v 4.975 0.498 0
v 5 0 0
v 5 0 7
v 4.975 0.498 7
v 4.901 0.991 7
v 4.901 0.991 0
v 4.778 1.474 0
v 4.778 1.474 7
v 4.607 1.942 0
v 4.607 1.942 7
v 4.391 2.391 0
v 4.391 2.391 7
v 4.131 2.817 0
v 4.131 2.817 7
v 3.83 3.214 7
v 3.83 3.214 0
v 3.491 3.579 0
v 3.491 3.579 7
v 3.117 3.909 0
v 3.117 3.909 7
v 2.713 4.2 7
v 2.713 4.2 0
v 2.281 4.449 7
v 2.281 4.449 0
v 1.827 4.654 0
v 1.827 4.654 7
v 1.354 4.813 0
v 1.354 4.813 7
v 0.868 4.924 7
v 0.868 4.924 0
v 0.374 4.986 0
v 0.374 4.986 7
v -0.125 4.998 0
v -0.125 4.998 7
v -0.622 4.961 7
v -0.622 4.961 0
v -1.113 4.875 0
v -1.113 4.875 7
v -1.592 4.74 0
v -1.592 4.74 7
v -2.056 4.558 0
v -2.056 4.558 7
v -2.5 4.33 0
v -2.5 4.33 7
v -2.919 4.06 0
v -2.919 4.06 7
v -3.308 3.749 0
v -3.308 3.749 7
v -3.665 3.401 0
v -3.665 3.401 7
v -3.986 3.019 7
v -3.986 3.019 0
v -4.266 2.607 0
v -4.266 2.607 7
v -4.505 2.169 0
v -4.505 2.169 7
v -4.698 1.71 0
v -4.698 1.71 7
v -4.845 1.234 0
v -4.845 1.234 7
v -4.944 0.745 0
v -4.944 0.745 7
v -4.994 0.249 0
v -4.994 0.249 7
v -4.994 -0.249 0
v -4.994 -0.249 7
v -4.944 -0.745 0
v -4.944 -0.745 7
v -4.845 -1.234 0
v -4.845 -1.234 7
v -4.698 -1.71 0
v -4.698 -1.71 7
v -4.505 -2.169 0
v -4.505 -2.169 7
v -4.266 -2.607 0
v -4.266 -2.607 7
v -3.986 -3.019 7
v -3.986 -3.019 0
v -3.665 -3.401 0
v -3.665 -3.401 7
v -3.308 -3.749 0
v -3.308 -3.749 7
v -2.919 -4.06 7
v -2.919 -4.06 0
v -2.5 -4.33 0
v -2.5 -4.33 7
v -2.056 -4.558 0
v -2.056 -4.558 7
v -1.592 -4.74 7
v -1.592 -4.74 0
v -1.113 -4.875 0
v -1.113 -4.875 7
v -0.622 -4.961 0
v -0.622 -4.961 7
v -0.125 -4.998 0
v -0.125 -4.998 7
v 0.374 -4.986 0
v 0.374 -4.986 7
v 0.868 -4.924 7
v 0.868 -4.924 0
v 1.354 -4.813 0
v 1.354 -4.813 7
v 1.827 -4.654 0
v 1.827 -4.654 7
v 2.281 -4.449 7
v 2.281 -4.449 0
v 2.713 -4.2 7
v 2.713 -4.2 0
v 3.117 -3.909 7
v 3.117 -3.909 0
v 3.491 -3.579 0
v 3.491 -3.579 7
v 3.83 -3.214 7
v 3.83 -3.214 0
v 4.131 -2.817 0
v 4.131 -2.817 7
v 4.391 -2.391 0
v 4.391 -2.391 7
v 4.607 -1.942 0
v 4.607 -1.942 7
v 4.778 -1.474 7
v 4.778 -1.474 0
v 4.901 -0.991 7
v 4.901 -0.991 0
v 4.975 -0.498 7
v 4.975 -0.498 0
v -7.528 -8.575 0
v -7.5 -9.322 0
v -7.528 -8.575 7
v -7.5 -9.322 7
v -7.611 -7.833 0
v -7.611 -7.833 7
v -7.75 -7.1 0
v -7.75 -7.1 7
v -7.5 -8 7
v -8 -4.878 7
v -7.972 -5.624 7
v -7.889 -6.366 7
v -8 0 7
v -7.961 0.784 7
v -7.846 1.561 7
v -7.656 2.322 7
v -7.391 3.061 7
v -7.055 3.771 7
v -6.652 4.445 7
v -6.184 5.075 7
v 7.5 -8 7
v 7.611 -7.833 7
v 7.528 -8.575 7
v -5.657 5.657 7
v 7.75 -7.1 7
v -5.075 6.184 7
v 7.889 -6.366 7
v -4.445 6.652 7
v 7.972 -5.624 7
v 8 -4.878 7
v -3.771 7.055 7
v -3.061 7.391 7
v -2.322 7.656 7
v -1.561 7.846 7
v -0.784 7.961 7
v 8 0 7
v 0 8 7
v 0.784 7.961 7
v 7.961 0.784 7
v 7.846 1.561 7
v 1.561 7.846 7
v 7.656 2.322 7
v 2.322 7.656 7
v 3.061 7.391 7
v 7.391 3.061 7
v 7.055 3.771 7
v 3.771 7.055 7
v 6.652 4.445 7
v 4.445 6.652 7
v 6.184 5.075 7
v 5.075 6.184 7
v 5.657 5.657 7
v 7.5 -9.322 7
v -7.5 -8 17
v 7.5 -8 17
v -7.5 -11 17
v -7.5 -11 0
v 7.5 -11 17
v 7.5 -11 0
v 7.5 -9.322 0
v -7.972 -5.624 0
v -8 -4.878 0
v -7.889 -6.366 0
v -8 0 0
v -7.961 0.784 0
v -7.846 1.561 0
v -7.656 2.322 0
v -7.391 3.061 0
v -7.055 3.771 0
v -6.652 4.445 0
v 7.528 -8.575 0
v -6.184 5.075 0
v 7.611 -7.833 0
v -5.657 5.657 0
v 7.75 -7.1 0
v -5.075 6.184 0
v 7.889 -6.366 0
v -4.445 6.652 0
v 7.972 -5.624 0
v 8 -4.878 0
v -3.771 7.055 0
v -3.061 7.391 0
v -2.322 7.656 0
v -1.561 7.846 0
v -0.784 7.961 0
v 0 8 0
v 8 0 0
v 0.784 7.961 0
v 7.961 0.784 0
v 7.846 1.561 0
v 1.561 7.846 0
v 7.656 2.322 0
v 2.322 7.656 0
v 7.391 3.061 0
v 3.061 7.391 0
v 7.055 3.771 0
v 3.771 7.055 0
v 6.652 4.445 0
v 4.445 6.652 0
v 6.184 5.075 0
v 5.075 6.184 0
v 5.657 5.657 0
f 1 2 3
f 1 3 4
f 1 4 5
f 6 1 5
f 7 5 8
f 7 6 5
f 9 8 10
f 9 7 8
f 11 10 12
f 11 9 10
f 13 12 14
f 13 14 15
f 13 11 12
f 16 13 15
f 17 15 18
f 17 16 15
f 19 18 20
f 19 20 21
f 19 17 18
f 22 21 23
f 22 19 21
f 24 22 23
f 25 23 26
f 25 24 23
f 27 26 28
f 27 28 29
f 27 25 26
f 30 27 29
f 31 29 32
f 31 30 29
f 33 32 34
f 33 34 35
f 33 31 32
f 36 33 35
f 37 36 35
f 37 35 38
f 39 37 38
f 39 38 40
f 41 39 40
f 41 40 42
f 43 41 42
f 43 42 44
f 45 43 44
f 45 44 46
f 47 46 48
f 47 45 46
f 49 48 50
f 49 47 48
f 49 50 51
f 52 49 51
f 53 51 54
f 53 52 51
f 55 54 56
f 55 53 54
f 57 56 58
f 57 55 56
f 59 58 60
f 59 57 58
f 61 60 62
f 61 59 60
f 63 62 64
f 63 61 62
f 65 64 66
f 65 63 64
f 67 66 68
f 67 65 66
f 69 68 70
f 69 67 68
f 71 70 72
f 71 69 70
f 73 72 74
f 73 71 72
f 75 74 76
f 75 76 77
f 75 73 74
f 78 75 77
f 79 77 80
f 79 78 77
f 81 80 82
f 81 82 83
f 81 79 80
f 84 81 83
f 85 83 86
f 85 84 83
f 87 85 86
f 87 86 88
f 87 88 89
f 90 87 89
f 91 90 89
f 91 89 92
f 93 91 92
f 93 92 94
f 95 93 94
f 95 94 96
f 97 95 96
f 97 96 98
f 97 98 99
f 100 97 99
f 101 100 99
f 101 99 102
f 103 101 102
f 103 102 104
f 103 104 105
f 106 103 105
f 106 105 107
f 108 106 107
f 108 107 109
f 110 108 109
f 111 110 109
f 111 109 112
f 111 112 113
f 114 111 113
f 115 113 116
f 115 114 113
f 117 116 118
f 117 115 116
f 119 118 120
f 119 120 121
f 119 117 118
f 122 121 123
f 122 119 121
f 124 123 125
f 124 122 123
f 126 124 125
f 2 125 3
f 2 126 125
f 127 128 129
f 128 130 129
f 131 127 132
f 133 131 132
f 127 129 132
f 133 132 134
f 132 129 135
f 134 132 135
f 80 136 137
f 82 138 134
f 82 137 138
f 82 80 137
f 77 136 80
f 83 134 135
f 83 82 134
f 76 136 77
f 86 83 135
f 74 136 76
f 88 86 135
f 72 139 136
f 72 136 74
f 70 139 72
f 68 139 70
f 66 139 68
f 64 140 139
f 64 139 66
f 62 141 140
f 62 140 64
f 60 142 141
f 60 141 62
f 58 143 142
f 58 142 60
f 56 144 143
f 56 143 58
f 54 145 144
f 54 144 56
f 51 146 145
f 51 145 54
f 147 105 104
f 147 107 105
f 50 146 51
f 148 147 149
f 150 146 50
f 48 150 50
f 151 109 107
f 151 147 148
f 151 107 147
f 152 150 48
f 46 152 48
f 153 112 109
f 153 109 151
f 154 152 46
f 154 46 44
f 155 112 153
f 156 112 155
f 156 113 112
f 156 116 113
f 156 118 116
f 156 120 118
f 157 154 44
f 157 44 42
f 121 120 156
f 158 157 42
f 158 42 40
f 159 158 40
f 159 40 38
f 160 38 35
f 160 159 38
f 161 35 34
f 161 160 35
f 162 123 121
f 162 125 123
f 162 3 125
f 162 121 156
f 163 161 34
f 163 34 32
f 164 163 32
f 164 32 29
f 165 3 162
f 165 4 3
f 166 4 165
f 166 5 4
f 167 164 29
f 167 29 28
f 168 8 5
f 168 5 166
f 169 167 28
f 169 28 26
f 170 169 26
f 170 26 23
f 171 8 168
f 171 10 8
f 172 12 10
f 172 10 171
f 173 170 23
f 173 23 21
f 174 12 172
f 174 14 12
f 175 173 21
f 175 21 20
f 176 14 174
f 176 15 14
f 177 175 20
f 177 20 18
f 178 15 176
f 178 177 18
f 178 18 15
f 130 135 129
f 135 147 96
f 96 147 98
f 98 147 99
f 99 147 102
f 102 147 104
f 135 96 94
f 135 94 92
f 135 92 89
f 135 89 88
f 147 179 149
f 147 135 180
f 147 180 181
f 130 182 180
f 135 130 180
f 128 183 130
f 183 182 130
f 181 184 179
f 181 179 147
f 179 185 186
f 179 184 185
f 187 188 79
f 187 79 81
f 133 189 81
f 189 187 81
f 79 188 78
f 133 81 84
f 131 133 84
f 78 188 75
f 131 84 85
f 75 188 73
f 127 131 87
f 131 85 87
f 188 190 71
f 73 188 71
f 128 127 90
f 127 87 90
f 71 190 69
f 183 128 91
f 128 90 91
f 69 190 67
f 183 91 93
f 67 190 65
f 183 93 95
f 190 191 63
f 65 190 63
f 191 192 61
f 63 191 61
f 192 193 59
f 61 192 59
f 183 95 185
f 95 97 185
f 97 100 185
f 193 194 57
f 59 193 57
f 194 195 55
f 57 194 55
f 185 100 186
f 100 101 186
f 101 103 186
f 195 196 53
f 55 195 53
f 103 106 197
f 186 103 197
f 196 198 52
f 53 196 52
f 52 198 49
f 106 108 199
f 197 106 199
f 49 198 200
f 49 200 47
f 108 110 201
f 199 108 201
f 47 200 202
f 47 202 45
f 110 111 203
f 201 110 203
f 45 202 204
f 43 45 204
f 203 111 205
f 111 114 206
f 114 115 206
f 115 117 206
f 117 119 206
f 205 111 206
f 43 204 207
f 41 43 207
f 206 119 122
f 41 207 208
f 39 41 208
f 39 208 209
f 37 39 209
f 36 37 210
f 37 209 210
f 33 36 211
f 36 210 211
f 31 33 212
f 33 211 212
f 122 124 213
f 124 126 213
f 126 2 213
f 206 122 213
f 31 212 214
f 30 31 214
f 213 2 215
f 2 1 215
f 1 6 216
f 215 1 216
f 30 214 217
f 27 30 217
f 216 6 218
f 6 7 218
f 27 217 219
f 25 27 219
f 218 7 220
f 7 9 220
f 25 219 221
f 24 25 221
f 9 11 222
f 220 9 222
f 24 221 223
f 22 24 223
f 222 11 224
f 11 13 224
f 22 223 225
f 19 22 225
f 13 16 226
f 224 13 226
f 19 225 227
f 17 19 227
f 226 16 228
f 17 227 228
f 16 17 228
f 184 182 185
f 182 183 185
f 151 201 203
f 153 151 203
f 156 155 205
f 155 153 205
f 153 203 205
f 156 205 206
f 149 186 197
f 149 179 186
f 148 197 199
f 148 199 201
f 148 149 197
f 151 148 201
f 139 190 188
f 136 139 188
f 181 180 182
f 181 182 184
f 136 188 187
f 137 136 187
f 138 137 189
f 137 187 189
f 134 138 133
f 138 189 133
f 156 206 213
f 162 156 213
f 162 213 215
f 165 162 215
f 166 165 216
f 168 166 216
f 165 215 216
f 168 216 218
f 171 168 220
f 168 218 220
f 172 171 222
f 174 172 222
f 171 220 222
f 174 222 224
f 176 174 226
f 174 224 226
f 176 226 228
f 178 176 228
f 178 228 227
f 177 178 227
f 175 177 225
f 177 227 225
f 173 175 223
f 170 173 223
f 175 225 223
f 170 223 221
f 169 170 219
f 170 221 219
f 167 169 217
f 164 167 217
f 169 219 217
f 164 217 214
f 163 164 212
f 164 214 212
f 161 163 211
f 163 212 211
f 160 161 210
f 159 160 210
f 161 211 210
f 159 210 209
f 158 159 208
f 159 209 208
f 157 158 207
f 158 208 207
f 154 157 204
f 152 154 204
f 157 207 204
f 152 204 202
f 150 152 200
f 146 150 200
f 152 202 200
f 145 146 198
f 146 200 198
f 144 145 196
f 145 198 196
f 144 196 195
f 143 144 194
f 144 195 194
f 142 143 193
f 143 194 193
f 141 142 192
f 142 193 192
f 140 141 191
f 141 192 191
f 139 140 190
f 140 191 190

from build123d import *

# Parameters (mm, degrees)
SKETCH1_R           = 5
BOSS_EXTRUDE1_DEPTH = 7
SKETCH2_W           = 15
SKETCH2_H           = 3
BOSS_EXTRUDE2_DEPTH = 10
FILLET1_R           = 10
FILLET2_R           = 10


with BuildPart() as part:
    # Sketch1 → Boss-Extrude1 (new body)
    with BuildSketch(Plane.XY):
        with BuildLine():
            Line((-8, 0), (-8, -8))
            Line((-8, -8), (-7.5, -8))
            Line((-7.5, -8), (-7.5, -11))
            Line((-7.5, -11), (7.5, -11))
            Line((7.5, -11), (7.5, -8))
            Line((7.5, -8), (8, -8))
            Line((8, -8), (8, 0))
            ThreePointArc((8, 0), (0, 8), (-8, 0))
        make_face()
        Circle(SKETCH1_R, mode=Mode.SUBTRACT)
    extrude(amount=BOSS_EXTRUDE1_DEPTH)

    # Sketch2 → Boss-Extrude2 (add)
    with BuildSketch(Plane.XY.offset(7)):
        with Locations((0, -9.5)):
            Rectangle(SKETCH2_W, SKETCH2_H)
    extrude(amount=BOSS_EXTRUDE2_DEPTH)

    # Fillet1
    # the kernel refuses this fillet: 10 mm, written as the material it takes off along each edge
    with BuildSketch(Plane(origin=(-8, -8, -7.806247498), x_dir=(0, 1, 0), z_dir=(0, 0, 1))) as fillet1_piece_1:
        with BuildLine():
            CenterArc((3.122498999, -10), FILLET1_R, 90, 18.194872339)
            Line((0, -0.5), (0, 0))
            Line((0, 0), (3.122498999, 0))
        make_face()
    extrude(amount=22.612494996, mode=Mode.SUBTRACT)
    with BuildSketch(Plane(origin=(8, -8, -7.806247498), x_dir=(-1.0, 2.199129767162818e-12, 0), z_dir=(0, 0, 1))) as fillet1_piece_2:
        with BuildLine():
            CenterArc((10, -3.122498999), FILLET1_R, 161.805127661, 18.194872339)
            Line((0, -3.122498999), (0, 0))
            Line((0, 0), (0.5, 0))
        make_face()
    extrude(amount=22.612494996, mode=Mode.SUBTRACT)

    # Fillet2
    fillet2_edges = [part.edges().sort_by_distance(p)[0] for p in [
        (7.5, -8, 3.5),
        (-7.5, -8, 3.5),
    ]]
    fillet(fillet2_edges, radius=FILLET2_R)


solid = part.part
